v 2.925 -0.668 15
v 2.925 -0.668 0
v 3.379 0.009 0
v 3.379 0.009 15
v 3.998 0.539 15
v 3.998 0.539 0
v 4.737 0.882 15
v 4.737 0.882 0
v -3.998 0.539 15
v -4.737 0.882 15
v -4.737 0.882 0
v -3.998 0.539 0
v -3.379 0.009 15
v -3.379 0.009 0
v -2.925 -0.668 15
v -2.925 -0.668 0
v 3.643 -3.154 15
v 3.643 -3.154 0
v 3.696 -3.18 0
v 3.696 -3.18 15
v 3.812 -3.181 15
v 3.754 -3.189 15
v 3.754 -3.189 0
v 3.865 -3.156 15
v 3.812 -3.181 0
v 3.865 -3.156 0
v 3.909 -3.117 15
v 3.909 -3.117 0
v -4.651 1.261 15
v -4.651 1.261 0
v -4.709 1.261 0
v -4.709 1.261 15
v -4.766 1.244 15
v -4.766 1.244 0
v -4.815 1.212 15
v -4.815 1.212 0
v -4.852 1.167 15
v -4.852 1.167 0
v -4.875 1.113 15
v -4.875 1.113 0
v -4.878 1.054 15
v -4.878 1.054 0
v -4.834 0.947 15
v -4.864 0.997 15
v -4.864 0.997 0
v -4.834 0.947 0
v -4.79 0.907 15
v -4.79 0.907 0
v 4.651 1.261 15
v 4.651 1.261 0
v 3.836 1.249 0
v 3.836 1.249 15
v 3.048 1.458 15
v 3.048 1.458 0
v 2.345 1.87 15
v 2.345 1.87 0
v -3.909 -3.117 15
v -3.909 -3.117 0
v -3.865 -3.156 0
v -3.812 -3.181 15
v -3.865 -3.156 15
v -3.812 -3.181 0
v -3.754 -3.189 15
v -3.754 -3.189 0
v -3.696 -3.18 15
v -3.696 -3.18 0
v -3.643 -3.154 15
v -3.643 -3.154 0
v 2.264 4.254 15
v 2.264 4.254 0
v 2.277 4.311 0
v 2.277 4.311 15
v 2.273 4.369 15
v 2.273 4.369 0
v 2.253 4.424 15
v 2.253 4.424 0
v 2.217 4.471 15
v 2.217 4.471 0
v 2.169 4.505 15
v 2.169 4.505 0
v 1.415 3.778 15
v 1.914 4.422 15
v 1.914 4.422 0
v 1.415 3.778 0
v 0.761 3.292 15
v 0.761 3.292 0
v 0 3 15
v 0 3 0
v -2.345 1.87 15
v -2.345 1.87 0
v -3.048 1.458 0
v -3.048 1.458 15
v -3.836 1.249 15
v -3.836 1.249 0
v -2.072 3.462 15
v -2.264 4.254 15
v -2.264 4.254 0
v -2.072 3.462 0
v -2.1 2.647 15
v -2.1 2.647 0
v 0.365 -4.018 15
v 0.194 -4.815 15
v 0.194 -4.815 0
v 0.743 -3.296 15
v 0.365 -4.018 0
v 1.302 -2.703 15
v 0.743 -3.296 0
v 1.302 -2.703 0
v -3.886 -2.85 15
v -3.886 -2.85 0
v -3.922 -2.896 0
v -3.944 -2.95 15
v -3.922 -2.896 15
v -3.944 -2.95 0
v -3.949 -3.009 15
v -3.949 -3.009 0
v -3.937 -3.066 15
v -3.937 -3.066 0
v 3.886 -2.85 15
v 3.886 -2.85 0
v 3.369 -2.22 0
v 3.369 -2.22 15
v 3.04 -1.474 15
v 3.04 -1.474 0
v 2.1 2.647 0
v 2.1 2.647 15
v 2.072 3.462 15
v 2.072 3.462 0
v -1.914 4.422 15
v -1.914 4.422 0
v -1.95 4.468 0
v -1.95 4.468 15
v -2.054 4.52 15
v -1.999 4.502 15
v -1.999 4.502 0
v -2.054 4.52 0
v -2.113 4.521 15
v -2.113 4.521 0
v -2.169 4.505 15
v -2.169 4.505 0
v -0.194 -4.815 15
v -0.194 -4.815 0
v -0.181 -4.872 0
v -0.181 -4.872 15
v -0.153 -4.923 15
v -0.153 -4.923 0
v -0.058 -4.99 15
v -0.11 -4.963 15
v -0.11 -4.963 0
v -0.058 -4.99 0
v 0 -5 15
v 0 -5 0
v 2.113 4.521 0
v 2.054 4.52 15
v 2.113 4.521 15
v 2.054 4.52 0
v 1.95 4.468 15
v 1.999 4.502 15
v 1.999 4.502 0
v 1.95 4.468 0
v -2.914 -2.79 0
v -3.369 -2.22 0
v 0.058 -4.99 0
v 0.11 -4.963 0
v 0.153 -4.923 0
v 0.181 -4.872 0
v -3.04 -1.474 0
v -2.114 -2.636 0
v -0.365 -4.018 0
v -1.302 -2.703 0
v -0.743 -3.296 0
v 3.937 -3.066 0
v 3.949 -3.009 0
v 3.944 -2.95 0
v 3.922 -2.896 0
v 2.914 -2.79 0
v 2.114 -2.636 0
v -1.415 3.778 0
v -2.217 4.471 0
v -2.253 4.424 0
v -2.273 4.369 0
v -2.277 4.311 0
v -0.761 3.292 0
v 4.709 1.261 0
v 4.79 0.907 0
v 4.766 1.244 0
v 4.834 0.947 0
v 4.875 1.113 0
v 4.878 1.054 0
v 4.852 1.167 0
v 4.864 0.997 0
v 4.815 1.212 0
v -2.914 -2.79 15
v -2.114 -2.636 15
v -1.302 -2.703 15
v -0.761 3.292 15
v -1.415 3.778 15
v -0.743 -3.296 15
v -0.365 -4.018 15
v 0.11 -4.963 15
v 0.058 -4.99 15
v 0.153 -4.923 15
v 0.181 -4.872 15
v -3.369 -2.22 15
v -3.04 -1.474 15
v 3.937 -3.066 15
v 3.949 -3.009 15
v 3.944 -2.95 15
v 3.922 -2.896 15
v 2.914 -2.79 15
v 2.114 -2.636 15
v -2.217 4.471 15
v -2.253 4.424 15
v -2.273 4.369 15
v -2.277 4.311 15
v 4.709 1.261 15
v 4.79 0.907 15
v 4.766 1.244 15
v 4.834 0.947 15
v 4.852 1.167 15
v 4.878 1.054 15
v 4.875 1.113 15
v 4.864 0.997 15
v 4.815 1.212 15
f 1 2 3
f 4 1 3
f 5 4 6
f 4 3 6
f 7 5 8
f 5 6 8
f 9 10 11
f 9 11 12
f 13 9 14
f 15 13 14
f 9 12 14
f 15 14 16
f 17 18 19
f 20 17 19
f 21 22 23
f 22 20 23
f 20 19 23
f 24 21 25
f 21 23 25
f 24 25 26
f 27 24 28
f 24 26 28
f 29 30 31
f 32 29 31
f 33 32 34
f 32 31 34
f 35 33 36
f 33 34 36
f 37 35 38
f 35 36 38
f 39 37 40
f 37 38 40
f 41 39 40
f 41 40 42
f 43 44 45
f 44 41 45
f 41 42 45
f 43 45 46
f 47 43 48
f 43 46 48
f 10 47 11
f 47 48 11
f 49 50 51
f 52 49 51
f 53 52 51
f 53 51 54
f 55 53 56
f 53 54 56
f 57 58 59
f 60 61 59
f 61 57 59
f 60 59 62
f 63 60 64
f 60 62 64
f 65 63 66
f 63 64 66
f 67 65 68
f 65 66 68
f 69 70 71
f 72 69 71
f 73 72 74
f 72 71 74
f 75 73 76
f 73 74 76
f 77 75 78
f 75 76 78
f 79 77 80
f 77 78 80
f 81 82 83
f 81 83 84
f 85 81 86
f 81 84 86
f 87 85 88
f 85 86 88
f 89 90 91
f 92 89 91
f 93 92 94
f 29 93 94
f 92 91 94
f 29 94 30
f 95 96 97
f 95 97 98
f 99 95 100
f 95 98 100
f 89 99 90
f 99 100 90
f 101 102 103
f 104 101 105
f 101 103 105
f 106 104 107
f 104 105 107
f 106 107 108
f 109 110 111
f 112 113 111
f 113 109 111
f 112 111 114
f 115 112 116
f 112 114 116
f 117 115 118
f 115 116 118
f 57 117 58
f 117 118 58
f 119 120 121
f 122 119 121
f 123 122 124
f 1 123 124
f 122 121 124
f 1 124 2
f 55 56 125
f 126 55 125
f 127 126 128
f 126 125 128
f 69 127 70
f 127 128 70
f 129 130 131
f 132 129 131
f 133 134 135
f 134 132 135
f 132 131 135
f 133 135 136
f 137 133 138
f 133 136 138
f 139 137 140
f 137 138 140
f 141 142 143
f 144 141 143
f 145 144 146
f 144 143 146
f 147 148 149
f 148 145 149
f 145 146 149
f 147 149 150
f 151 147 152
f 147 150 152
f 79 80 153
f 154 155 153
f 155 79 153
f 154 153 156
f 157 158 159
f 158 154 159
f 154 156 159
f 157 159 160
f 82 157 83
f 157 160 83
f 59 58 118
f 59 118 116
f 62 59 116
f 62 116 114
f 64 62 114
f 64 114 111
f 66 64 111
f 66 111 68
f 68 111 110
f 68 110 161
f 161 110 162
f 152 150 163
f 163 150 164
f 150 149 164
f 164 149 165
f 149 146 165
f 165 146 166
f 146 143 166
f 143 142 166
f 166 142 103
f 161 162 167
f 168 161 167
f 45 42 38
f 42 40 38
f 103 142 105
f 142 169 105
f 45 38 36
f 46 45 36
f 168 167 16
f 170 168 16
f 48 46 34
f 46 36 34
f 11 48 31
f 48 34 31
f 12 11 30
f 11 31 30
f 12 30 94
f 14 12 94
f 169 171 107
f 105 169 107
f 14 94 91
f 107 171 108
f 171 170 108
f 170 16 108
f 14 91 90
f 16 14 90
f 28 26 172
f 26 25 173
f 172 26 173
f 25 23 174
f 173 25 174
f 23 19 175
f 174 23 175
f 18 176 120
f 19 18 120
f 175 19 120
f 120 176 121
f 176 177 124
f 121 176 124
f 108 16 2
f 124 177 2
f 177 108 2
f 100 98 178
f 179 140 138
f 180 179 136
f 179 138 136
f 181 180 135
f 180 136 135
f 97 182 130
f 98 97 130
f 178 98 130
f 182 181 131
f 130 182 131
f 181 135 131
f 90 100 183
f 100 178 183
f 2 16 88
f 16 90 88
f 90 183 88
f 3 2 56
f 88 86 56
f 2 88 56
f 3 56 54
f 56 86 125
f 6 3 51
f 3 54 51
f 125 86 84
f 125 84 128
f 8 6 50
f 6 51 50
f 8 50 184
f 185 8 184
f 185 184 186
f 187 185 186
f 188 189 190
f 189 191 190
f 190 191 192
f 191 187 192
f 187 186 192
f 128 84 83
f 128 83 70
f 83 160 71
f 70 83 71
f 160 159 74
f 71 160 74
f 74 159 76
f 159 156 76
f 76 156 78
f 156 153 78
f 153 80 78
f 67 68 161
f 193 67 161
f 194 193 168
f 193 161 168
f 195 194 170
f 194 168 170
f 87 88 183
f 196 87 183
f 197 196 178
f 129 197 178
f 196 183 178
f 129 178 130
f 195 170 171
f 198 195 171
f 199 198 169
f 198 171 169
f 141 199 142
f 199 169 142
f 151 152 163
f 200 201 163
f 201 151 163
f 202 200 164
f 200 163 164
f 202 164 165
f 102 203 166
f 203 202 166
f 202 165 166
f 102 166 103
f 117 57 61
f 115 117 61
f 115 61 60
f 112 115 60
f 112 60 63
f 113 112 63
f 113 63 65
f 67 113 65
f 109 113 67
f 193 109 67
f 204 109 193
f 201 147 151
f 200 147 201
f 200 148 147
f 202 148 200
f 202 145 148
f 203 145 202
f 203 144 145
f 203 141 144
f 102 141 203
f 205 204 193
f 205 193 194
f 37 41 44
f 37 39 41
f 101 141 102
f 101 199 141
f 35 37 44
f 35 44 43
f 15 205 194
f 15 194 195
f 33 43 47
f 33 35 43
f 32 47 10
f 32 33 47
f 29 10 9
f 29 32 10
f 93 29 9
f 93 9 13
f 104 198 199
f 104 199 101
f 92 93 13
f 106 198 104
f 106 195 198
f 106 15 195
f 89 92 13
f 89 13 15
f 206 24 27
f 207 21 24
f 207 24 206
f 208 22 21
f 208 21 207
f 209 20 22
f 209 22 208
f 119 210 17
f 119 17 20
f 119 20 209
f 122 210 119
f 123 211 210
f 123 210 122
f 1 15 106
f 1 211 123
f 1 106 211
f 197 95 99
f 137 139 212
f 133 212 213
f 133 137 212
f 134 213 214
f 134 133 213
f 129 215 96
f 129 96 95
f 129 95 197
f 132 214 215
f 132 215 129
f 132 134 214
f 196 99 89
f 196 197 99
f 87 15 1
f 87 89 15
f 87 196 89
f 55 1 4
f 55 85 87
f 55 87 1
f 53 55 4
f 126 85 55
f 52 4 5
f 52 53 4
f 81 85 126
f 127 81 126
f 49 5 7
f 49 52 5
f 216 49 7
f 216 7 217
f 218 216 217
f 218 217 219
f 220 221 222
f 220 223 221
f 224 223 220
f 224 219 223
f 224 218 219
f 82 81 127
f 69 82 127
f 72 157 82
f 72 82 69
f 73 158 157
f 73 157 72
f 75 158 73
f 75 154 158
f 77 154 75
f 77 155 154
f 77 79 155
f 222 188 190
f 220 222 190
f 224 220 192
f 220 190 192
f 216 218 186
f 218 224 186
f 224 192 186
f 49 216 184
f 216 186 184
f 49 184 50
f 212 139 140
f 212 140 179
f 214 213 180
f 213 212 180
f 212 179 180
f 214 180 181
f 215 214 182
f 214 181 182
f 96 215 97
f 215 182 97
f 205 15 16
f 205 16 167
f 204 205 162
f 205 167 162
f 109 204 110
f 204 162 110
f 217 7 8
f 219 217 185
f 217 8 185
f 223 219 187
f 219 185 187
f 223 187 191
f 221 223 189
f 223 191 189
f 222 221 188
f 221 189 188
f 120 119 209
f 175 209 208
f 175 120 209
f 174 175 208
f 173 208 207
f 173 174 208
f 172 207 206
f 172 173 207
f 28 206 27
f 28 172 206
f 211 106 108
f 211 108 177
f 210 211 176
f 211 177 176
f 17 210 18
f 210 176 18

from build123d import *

# Parameters (mm, degrees)
F1_DEPTH    = 15
F2_T1_DEPTH = 15.9585845768


# Not quite as in the source:
# - a fillet or chamfer that OpenCascade refuses, or shapes differently, is made with other operations: its cross-section is extruded or revolved along the edge and cut away or added


with BuildPart() as f1:
    # F0 (on Top) → F1 (new body)
    with BuildSketch(Plane.XY):
        with BuildLine():
            ThreePointArc((2.9247837365, -0.6675628019), (3.7405193144, 0.3530547619), (4.9127228226, 0.9301368008))
            ThreePointArc((4.9127228226, 0.9301368008), (4.8746395609, 1.1126046698), (4.8297815528, 1.2935262471))
            ThreePointArc((4.8297815528, 1.2935262471), (3.5232761722, 1.3048591573), (2.3454944474, 1.8704694056))
            ThreePointArc((2.3454944474, 1.8704694056), (2.0561463183, 3.1445818043), (2.3358223454, 4.420852177))
            ThreePointArc((2.3358223454, 4.420852177), (2.1694186956, 4.5048443395), (2, 4.582575695))
            ThreePointArc((2, 4.582575695), (1.1765467932, 3.5681746103), (0, 3))
            ThreePointArc((0, 3), (-1.1765467932, 3.5681746103), (-2, 4.582575695))
            ThreePointArc((-2, 4.582575695), (-2.1694186956, 4.5048443395), (-2.3358223454, 4.420852177))
            ThreePointArc((-2.3358223454, 4.420852177), (-2.0561463183, 3.1445818043), (-2.3454944474, 1.8704694056))
            ThreePointArc((-2.3454944474, 1.8704694056), (-3.5232761722, 1.3048591573), (-4.8297815528, 1.2935262471))
            ThreePointArc((-4.8297815528, 1.2935262471), (-4.8746395609, 1.1126046698), (-4.9127228226, 0.9301368008))
            ThreePointArc((-4.9127228226, 0.9301368008), (-3.7405193144, 0.3530547619), (-2.9247837365, -0.6675628019))
            ThreePointArc((-2.9247837365, -0.6675628019), (-3.2169067319, -1.9410418555), (-4.0226390868, -2.9695748479))
            ThreePointArc((-4.0226390868, -2.9695748479), (-3.9091574123, -3.1174490093), (-3.7902428131, -3.2609905577))
            ThreePointArc((-3.7902428131, -3.2609905577), (-2.608204974, -2.7043297172), (-1.3016512174, -2.7029066037))
            ThreePointArc((-1.3016512174, -2.7029066037), (-0.4881409094, -3.725298761), (-0.1863673415, -4.9965255142))
            ThreePointArc((-0.1863673415, -4.9965255142), (0, -5), (0.1863673415, -4.9965255142))
            ThreePointArc((0.1863673415, -4.9965255142), (0.4881409094, -3.725298761), (1.3016512174, -2.7029066037))
            ThreePointArc((1.3016512174, -2.7029066037), (2.608204974, -2.7043297172), (3.7902428131, -3.2609905577))
            ThreePointArc((3.7902428131, -3.2609905577), (3.9091574123, -3.1174490093), (4.0226390868, -2.9695748479))
            ThreePointArc((4.0226390868, -2.9695748479), (3.2169067319, -1.9410418555), (2.9247837365, -0.6675628019))
        make_face()
    extrude(amount=F1_DEPTH)

    # F2: fillet of radius 0.2 on 14 edges, made by hand

    # F2_s2 → F2_t1 (cut)
    with BuildSketch(Plane.XY.offset(-0.4792922884)):
        with BuildLine():
            ThreePointArc((-3.9124710062, -3.1132893578), (-3.785825601, -3.1865171636), (-3.6432075854, -3.1539369268))
            ThreePointArc((-3.6432075854, -3.1539369268), (-3.7175366677, -3.2063492126), (-3.7902428131, -3.2609905577))
            ThreePointArc((-3.7902428131, -3.2609905577), (-3.8520648952, -3.1877258419), (-3.9124710062, -3.1132893578))
        make_face()
        with BuildLine():
            ThreePointArc((-3.8855510977, -2.8500477743), (-3.949049974, -2.9818402738), (-3.905839396, -3.121605134))
            ThreePointArc((-3.905839396, -3.121605134), (-3.9649679778, -3.0461498543), (-4.0226390868, -2.9695748479))
            ThreePointArc((-4.0226390868, -2.9695748479), (-3.9531890749, -2.9108504406), (-3.8855510977, -2.8500477743))
        make_face()
        with BuildLine():
            ThreePointArc((-0.1943444075, -4.814821897), (-0.1308957841, -4.946638597), (0.0053181385, -4.9999971717))
            ThreePointArc((0.0053181385, -4.9999971717), (-0.0905412424, -4.9991801611), (-0.1863673415, -4.9965255142))
            ThreePointArc((-0.1863673415, -4.9965255142), (-0.1889785578, -4.9056132393), (-0.1943444075, -4.814821897))
        make_face()
        with BuildLine():
            ThreePointArc((-0.0053181385, -4.9999971717), (0.1308957841, -4.946638597), (0.1943444075, -4.814821897))
            ThreePointArc((0.1943444075, -4.814821897), (0.1889785578, -4.9056132393), (0.1863673415, -4.9965255142))
            ThreePointArc((0.1863673415, -4.9965255142), (0.0905412424, -4.9991801611), (-0.0053181385, -4.9999971717))
        make_face()
        with BuildLine():
            ThreePointArc((3.6432075854, -3.1539369268), (3.785825601, -3.1865171636), (3.9124710062, -3.1132893578))
            ThreePointArc((3.9124710062, -3.1132893578), (3.8520648952, -3.1877258419), (3.7902428131, -3.2609905577))
            ThreePointArc((3.7902428131, -3.2609905577), (3.7175366677, -3.2063492126), (3.6432075854, -3.1539369268))
        make_face()
        with BuildLine():
            ThreePointArc((3.8855510977, -2.8500477743), (3.949049974, -2.9818402738), (3.905839396, -3.121605134))
            ThreePointArc((3.905839396, -3.121605134), (3.9649679778, -3.0461498543), (4.0226390868, -2.9695748479))
            ThreePointArc((4.0226390868, -2.9695748479), (3.9531890749, -2.9108504406), (3.8855510977, -2.8500477743))
        make_face()
        with BuildLine():
            ThreePointArc((4.7373499587, 0.8819268779), (4.8517430918, 0.973116687), (4.8734534064, 1.1177888421))
            ThreePointArc((4.8734534064, 1.1177888421), (4.8939875989, 1.024151054), (4.9127228226, 0.9301368008))
            ThreePointArc((4.9127228226, 0.9301368008), (4.8246709586, 0.9073611688), (4.7373499587, 0.8819268779))
        make_face()
        with BuildLine():
            ThreePointArc((4.8758202007, 1.1074192388), (4.7934889875, 1.228344594), (4.6508585605, 1.2608704528))
            ThreePointArc((4.6508585605, 1.2608704528), (4.7405675882, 1.2758421104), (4.8297815528, 1.2935262471))
            ThreePointArc((4.8297815528, 1.2935262471), (4.8536929553, 1.2006934229), (4.8758202007, 1.1074192388))
        make_face()
        with BuildLine():
            ThreePointArc((2.2641711887, 4.2536817555), (2.2641990769, 4.3999738244), (2.1646259913, 4.5071492451))
            ThreePointArc((2.1646259913, 4.5071492451), (2.2506378215, 4.4648213174), (2.3358223454, 4.420852177))
            ThreePointArc((2.3358223454, 4.420852177), (2.2987296122, 4.3378100833), (2.2641711887, 4.2536817555))
        make_face()
        with BuildLine():
            ThreePointArc((2.1742089456, 4.5025343375), (2.0283330241, 4.5135609289), (1.913974667, 4.4223275119))
            ThreePointArc((1.913974667, 4.4223275119), (1.9582020177, 4.5017995299), (2, 4.582575695))
            ThreePointArc((2, 4.582575695), (2.0874881401, 4.543390063), (2.1742089456, 4.5025343375))
        make_face()
        with BuildLine():
            ThreePointArc((-1.913974667, 4.4223275119), (-2.0283330241, 4.5135609289), (-2.1742089456, 4.5025343375))
            ThreePointArc((-2.1742089456, 4.5025343375), (-2.0874881401, 4.543390063), (-2, 4.582575695))
            ThreePointArc((-2, 4.582575695), (-1.9582020177, 4.5017995299), (-1.913974667, 4.4223275119))
        make_face()
        with BuildLine():
            ThreePointArc((-2.1646259913, 4.5071492451), (-2.2641990769, 4.3999738244), (-2.2641711887, 4.2536817555))
            ThreePointArc((-2.2641711887, 4.2536817555), (-2.2987296122, 4.3378100833), (-2.3358223454, 4.420852177))
            ThreePointArc((-2.3358223454, 4.420852177), (-2.2506378215, 4.4648213174), (-2.1646259913, 4.5071492451))
        make_face()
        with BuildLine():
            ThreePointArc((-4.8734534064, 1.1177888421), (-4.8517430918, 0.973116687), (-4.7373499587, 0.8819268779))
            ThreePointArc((-4.7373499587, 0.8819268779), (-4.8246709586, 0.9073611688), (-4.9127228226, 0.9301368008))
            ThreePointArc((-4.9127228226, 0.9301368008), (-4.8939875989, 1.024151054), (-4.8734534064, 1.1177888421))
        make_face()
        with BuildLine():
            ThreePointArc((-4.6508585605, 1.2608704528), (-4.7934889875, 1.228344594), (-4.8758202007, 1.1074192388))
            ThreePointArc((-4.8758202007, 1.1074192388), (-4.8536929553, 1.2006934229), (-4.8297815528, 1.2935262471))
            ThreePointArc((-4.8297815528, 1.2935262471), (-4.7405675882, 1.2758421104), (-4.6508585605, 1.2608704528))
        make_face()
    extrude(amount=F2_T1_DEPTH, mode=Mode.SUBTRACT)


solid = f1.part
